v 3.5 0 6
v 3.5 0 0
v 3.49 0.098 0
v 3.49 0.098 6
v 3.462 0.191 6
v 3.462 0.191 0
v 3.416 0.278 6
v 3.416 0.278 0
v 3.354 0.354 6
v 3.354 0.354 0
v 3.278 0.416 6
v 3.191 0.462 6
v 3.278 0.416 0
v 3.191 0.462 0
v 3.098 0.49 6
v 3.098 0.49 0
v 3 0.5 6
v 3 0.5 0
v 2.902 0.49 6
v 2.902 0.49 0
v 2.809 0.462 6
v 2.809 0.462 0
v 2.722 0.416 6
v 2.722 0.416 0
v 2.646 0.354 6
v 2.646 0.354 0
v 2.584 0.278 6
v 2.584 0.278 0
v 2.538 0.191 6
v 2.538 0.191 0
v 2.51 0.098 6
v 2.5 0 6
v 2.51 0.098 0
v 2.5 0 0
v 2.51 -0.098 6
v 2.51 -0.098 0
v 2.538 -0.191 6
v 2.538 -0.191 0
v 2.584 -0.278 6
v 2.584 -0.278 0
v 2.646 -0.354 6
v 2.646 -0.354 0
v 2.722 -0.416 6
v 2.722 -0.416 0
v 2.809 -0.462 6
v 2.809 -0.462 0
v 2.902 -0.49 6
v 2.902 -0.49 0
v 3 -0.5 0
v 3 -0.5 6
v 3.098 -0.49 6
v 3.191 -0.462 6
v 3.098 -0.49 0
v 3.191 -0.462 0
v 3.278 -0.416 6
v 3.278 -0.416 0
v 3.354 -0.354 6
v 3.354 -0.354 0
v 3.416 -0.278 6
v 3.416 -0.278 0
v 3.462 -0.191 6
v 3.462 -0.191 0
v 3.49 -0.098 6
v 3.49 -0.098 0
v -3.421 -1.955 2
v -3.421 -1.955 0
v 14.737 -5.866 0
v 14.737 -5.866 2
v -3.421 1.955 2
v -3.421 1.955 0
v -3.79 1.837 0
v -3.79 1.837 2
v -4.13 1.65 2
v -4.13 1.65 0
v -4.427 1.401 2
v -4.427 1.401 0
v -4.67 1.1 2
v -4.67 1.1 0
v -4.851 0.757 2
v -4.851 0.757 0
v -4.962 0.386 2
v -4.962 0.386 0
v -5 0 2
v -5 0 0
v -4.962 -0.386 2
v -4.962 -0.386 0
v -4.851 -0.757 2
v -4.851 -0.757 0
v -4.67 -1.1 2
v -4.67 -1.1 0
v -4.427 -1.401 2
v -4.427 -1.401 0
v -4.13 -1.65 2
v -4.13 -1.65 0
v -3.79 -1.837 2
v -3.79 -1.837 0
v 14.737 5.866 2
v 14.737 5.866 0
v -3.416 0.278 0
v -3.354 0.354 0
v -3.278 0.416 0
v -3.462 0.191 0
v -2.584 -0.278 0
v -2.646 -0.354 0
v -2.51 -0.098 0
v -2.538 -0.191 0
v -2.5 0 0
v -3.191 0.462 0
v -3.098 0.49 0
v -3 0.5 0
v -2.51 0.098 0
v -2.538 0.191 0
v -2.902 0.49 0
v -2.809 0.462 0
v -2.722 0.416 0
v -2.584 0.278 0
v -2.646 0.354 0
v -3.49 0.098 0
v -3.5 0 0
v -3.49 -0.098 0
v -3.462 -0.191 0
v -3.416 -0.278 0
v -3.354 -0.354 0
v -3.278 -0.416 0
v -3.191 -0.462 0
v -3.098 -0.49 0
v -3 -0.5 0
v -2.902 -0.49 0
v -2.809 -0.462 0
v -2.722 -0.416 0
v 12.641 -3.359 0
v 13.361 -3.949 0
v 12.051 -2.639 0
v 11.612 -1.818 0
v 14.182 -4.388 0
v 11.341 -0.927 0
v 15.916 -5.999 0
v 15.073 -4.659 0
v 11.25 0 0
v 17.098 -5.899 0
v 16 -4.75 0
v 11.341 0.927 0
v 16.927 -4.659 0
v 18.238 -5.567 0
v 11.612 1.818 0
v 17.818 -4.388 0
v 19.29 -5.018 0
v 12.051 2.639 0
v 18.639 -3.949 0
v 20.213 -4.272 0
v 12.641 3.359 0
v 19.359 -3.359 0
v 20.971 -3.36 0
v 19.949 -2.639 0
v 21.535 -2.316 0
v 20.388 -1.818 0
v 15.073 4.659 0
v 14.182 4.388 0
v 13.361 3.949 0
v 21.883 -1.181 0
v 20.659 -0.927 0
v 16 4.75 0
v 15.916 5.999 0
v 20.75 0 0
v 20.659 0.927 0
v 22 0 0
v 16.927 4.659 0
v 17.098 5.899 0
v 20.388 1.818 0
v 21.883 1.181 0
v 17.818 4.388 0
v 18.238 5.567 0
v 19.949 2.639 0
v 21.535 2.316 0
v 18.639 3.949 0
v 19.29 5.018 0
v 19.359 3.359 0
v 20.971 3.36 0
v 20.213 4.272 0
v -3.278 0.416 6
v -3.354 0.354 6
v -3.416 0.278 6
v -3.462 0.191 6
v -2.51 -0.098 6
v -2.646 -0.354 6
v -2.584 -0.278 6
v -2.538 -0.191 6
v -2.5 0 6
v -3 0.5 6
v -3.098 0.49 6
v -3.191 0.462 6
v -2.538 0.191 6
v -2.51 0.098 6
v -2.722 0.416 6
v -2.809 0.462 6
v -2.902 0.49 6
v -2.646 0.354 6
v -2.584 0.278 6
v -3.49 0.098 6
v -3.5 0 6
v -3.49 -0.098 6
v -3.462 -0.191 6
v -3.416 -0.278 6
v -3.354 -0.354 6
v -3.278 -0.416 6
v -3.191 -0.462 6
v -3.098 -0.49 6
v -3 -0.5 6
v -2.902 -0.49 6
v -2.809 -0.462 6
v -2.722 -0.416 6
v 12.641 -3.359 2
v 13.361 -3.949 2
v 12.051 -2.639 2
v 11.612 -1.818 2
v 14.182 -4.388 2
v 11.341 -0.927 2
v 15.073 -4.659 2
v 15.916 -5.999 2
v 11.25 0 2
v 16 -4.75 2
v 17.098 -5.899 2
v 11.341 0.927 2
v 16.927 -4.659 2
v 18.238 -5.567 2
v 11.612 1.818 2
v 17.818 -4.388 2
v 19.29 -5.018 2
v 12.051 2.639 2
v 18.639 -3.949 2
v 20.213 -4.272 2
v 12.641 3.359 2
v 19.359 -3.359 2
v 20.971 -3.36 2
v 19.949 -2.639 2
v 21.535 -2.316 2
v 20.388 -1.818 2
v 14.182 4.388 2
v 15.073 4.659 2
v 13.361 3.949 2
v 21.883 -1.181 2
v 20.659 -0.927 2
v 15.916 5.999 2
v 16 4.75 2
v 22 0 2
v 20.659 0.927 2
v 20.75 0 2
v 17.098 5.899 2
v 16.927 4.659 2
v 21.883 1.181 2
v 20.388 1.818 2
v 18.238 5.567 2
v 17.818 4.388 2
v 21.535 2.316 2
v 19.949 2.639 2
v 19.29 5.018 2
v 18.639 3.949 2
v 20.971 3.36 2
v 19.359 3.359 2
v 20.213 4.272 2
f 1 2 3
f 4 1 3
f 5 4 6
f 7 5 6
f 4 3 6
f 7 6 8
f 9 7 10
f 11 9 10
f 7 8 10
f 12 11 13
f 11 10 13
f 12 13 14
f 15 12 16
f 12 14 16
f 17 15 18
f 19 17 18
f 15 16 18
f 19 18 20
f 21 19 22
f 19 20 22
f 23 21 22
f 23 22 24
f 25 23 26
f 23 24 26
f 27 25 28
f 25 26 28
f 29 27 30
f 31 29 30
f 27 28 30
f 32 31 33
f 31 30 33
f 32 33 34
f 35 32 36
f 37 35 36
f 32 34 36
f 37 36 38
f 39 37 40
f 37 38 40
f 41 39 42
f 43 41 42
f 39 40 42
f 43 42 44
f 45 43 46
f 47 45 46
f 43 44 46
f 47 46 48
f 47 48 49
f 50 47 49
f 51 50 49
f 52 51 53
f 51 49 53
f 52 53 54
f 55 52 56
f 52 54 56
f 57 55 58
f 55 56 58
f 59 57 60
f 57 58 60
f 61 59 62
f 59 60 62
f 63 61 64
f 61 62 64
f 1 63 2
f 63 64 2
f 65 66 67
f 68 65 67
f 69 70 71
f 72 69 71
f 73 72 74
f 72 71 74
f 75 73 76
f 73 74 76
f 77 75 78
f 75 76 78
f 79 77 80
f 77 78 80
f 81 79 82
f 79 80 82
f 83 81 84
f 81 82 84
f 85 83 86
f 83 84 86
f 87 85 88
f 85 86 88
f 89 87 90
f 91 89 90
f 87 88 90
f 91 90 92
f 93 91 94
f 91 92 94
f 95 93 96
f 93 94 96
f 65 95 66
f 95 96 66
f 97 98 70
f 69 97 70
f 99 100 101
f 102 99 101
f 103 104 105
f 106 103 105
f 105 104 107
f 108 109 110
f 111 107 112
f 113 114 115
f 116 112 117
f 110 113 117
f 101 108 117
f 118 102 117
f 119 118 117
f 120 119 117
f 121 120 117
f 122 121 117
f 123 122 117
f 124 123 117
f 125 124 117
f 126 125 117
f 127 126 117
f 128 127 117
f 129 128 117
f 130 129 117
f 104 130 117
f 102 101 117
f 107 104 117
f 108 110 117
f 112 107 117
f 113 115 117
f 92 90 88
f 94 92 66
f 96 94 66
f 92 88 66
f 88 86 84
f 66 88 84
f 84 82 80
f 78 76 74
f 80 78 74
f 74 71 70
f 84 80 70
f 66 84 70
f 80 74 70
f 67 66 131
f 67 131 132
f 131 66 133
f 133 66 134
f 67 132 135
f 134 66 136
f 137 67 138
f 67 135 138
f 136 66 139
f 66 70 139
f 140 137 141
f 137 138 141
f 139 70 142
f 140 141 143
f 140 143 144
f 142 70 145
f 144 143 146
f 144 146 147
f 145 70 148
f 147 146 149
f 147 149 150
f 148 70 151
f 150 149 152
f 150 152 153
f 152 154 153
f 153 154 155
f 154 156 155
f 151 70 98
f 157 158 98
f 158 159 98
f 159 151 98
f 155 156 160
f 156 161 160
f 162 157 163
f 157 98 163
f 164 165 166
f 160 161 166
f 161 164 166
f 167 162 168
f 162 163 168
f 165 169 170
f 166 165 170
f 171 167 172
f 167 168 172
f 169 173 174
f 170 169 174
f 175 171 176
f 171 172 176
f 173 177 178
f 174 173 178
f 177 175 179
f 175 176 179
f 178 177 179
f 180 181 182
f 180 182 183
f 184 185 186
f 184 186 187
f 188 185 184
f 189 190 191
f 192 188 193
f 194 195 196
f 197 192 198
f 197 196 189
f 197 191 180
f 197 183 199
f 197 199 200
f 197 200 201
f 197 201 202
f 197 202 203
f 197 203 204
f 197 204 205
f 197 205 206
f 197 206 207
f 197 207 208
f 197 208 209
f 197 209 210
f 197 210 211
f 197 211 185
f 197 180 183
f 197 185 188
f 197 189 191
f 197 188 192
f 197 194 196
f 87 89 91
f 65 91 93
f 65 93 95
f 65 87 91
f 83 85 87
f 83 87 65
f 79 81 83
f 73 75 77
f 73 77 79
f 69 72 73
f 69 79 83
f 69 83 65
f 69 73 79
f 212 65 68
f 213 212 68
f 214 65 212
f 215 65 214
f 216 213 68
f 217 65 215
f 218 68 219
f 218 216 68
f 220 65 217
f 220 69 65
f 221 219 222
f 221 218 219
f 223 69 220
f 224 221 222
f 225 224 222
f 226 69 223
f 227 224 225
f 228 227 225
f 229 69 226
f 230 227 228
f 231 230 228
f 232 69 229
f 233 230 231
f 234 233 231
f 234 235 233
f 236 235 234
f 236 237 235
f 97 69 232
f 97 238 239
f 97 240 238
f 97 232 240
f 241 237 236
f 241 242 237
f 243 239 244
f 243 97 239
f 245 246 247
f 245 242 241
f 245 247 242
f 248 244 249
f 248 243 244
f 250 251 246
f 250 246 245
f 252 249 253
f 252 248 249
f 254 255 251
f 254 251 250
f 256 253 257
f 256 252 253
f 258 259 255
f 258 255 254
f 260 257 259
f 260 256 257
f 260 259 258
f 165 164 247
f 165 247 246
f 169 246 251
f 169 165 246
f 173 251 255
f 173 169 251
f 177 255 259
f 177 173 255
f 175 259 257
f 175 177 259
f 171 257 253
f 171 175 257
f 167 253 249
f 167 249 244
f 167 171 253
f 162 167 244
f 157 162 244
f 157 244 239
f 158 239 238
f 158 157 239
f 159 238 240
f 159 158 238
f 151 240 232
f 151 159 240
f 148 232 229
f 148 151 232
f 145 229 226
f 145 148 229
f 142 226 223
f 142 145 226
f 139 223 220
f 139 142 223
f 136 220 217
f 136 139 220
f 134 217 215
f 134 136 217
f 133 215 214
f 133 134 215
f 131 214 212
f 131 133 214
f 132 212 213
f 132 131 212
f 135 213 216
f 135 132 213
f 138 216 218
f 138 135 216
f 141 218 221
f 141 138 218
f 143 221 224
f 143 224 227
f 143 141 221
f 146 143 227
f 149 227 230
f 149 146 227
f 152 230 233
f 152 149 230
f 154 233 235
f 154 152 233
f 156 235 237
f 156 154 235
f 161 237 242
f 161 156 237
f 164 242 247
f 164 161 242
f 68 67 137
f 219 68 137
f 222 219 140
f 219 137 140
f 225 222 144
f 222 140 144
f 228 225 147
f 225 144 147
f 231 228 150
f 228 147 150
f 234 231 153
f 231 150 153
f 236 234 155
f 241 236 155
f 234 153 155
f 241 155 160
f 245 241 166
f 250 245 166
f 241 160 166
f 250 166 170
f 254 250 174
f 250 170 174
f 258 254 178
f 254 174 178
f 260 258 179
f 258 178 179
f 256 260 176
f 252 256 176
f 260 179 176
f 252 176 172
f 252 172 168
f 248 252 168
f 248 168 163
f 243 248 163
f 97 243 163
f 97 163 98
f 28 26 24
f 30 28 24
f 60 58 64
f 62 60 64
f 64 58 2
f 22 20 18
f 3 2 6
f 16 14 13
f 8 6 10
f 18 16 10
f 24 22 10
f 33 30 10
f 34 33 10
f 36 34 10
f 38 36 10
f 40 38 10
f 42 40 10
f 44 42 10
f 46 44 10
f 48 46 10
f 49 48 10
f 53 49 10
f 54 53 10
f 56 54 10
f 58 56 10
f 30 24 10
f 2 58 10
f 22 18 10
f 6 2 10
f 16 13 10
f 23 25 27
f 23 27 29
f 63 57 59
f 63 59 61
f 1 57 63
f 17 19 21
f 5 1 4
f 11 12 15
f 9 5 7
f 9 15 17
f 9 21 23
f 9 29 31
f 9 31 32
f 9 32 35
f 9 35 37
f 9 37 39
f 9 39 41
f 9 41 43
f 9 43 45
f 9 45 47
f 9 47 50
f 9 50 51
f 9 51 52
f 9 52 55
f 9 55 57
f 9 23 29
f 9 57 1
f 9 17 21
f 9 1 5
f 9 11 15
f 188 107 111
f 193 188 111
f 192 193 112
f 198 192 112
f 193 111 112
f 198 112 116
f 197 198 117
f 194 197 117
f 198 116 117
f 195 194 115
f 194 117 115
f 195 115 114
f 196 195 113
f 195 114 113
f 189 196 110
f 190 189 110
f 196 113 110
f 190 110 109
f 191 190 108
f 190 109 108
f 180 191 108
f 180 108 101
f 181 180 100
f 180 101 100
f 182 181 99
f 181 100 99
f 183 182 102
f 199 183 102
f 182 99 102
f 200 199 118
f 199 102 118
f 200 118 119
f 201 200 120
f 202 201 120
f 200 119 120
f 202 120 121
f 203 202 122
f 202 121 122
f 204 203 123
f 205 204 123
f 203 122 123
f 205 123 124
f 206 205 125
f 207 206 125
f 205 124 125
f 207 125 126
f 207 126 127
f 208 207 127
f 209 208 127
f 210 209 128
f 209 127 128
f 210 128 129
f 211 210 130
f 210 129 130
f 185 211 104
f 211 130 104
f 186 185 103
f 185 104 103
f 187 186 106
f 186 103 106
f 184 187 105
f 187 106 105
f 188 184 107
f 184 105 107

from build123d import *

# Parameters (mm, degrees)
F0_R     = 0.5
F1_DEPTH = 6
F2_R     = 4.75
F3_DEPTH = 2


with BuildPart() as f1:
    # F0 (on Top) → F1 (new body)
    with BuildSketch(Plane.XY):
        with Locations((3, 0)):
            Circle(F0_R)
        with Locations((-3, 0)):
            Circle(F0_R)
    extrude(amount=F1_DEPTH)


with BuildPart() as f3:
    # F2 (on Top) → F3 (new body)
    with BuildSketch(Plane.XY):
        with BuildLine():
            Line((-3.421053, -1.955176), (14.736842, -5.865529))
            ThreePointArc((14.736842, -5.865529), (22, 0), (14.736842, 5.865529))
            Line((14.736842, 5.865529), (-3.421053, 1.955176))
            ThreePointArc((-3.421053, 1.955176), (-5, 0), (-3.421053, -1.955176))
        make_face()
        with Locations((16, 0)):
            Circle(F2_R, mode=Mode.SUBTRACT)
    extrude(amount=F3_DEPTH)


solid = Compound([f1.part, f3.part])
